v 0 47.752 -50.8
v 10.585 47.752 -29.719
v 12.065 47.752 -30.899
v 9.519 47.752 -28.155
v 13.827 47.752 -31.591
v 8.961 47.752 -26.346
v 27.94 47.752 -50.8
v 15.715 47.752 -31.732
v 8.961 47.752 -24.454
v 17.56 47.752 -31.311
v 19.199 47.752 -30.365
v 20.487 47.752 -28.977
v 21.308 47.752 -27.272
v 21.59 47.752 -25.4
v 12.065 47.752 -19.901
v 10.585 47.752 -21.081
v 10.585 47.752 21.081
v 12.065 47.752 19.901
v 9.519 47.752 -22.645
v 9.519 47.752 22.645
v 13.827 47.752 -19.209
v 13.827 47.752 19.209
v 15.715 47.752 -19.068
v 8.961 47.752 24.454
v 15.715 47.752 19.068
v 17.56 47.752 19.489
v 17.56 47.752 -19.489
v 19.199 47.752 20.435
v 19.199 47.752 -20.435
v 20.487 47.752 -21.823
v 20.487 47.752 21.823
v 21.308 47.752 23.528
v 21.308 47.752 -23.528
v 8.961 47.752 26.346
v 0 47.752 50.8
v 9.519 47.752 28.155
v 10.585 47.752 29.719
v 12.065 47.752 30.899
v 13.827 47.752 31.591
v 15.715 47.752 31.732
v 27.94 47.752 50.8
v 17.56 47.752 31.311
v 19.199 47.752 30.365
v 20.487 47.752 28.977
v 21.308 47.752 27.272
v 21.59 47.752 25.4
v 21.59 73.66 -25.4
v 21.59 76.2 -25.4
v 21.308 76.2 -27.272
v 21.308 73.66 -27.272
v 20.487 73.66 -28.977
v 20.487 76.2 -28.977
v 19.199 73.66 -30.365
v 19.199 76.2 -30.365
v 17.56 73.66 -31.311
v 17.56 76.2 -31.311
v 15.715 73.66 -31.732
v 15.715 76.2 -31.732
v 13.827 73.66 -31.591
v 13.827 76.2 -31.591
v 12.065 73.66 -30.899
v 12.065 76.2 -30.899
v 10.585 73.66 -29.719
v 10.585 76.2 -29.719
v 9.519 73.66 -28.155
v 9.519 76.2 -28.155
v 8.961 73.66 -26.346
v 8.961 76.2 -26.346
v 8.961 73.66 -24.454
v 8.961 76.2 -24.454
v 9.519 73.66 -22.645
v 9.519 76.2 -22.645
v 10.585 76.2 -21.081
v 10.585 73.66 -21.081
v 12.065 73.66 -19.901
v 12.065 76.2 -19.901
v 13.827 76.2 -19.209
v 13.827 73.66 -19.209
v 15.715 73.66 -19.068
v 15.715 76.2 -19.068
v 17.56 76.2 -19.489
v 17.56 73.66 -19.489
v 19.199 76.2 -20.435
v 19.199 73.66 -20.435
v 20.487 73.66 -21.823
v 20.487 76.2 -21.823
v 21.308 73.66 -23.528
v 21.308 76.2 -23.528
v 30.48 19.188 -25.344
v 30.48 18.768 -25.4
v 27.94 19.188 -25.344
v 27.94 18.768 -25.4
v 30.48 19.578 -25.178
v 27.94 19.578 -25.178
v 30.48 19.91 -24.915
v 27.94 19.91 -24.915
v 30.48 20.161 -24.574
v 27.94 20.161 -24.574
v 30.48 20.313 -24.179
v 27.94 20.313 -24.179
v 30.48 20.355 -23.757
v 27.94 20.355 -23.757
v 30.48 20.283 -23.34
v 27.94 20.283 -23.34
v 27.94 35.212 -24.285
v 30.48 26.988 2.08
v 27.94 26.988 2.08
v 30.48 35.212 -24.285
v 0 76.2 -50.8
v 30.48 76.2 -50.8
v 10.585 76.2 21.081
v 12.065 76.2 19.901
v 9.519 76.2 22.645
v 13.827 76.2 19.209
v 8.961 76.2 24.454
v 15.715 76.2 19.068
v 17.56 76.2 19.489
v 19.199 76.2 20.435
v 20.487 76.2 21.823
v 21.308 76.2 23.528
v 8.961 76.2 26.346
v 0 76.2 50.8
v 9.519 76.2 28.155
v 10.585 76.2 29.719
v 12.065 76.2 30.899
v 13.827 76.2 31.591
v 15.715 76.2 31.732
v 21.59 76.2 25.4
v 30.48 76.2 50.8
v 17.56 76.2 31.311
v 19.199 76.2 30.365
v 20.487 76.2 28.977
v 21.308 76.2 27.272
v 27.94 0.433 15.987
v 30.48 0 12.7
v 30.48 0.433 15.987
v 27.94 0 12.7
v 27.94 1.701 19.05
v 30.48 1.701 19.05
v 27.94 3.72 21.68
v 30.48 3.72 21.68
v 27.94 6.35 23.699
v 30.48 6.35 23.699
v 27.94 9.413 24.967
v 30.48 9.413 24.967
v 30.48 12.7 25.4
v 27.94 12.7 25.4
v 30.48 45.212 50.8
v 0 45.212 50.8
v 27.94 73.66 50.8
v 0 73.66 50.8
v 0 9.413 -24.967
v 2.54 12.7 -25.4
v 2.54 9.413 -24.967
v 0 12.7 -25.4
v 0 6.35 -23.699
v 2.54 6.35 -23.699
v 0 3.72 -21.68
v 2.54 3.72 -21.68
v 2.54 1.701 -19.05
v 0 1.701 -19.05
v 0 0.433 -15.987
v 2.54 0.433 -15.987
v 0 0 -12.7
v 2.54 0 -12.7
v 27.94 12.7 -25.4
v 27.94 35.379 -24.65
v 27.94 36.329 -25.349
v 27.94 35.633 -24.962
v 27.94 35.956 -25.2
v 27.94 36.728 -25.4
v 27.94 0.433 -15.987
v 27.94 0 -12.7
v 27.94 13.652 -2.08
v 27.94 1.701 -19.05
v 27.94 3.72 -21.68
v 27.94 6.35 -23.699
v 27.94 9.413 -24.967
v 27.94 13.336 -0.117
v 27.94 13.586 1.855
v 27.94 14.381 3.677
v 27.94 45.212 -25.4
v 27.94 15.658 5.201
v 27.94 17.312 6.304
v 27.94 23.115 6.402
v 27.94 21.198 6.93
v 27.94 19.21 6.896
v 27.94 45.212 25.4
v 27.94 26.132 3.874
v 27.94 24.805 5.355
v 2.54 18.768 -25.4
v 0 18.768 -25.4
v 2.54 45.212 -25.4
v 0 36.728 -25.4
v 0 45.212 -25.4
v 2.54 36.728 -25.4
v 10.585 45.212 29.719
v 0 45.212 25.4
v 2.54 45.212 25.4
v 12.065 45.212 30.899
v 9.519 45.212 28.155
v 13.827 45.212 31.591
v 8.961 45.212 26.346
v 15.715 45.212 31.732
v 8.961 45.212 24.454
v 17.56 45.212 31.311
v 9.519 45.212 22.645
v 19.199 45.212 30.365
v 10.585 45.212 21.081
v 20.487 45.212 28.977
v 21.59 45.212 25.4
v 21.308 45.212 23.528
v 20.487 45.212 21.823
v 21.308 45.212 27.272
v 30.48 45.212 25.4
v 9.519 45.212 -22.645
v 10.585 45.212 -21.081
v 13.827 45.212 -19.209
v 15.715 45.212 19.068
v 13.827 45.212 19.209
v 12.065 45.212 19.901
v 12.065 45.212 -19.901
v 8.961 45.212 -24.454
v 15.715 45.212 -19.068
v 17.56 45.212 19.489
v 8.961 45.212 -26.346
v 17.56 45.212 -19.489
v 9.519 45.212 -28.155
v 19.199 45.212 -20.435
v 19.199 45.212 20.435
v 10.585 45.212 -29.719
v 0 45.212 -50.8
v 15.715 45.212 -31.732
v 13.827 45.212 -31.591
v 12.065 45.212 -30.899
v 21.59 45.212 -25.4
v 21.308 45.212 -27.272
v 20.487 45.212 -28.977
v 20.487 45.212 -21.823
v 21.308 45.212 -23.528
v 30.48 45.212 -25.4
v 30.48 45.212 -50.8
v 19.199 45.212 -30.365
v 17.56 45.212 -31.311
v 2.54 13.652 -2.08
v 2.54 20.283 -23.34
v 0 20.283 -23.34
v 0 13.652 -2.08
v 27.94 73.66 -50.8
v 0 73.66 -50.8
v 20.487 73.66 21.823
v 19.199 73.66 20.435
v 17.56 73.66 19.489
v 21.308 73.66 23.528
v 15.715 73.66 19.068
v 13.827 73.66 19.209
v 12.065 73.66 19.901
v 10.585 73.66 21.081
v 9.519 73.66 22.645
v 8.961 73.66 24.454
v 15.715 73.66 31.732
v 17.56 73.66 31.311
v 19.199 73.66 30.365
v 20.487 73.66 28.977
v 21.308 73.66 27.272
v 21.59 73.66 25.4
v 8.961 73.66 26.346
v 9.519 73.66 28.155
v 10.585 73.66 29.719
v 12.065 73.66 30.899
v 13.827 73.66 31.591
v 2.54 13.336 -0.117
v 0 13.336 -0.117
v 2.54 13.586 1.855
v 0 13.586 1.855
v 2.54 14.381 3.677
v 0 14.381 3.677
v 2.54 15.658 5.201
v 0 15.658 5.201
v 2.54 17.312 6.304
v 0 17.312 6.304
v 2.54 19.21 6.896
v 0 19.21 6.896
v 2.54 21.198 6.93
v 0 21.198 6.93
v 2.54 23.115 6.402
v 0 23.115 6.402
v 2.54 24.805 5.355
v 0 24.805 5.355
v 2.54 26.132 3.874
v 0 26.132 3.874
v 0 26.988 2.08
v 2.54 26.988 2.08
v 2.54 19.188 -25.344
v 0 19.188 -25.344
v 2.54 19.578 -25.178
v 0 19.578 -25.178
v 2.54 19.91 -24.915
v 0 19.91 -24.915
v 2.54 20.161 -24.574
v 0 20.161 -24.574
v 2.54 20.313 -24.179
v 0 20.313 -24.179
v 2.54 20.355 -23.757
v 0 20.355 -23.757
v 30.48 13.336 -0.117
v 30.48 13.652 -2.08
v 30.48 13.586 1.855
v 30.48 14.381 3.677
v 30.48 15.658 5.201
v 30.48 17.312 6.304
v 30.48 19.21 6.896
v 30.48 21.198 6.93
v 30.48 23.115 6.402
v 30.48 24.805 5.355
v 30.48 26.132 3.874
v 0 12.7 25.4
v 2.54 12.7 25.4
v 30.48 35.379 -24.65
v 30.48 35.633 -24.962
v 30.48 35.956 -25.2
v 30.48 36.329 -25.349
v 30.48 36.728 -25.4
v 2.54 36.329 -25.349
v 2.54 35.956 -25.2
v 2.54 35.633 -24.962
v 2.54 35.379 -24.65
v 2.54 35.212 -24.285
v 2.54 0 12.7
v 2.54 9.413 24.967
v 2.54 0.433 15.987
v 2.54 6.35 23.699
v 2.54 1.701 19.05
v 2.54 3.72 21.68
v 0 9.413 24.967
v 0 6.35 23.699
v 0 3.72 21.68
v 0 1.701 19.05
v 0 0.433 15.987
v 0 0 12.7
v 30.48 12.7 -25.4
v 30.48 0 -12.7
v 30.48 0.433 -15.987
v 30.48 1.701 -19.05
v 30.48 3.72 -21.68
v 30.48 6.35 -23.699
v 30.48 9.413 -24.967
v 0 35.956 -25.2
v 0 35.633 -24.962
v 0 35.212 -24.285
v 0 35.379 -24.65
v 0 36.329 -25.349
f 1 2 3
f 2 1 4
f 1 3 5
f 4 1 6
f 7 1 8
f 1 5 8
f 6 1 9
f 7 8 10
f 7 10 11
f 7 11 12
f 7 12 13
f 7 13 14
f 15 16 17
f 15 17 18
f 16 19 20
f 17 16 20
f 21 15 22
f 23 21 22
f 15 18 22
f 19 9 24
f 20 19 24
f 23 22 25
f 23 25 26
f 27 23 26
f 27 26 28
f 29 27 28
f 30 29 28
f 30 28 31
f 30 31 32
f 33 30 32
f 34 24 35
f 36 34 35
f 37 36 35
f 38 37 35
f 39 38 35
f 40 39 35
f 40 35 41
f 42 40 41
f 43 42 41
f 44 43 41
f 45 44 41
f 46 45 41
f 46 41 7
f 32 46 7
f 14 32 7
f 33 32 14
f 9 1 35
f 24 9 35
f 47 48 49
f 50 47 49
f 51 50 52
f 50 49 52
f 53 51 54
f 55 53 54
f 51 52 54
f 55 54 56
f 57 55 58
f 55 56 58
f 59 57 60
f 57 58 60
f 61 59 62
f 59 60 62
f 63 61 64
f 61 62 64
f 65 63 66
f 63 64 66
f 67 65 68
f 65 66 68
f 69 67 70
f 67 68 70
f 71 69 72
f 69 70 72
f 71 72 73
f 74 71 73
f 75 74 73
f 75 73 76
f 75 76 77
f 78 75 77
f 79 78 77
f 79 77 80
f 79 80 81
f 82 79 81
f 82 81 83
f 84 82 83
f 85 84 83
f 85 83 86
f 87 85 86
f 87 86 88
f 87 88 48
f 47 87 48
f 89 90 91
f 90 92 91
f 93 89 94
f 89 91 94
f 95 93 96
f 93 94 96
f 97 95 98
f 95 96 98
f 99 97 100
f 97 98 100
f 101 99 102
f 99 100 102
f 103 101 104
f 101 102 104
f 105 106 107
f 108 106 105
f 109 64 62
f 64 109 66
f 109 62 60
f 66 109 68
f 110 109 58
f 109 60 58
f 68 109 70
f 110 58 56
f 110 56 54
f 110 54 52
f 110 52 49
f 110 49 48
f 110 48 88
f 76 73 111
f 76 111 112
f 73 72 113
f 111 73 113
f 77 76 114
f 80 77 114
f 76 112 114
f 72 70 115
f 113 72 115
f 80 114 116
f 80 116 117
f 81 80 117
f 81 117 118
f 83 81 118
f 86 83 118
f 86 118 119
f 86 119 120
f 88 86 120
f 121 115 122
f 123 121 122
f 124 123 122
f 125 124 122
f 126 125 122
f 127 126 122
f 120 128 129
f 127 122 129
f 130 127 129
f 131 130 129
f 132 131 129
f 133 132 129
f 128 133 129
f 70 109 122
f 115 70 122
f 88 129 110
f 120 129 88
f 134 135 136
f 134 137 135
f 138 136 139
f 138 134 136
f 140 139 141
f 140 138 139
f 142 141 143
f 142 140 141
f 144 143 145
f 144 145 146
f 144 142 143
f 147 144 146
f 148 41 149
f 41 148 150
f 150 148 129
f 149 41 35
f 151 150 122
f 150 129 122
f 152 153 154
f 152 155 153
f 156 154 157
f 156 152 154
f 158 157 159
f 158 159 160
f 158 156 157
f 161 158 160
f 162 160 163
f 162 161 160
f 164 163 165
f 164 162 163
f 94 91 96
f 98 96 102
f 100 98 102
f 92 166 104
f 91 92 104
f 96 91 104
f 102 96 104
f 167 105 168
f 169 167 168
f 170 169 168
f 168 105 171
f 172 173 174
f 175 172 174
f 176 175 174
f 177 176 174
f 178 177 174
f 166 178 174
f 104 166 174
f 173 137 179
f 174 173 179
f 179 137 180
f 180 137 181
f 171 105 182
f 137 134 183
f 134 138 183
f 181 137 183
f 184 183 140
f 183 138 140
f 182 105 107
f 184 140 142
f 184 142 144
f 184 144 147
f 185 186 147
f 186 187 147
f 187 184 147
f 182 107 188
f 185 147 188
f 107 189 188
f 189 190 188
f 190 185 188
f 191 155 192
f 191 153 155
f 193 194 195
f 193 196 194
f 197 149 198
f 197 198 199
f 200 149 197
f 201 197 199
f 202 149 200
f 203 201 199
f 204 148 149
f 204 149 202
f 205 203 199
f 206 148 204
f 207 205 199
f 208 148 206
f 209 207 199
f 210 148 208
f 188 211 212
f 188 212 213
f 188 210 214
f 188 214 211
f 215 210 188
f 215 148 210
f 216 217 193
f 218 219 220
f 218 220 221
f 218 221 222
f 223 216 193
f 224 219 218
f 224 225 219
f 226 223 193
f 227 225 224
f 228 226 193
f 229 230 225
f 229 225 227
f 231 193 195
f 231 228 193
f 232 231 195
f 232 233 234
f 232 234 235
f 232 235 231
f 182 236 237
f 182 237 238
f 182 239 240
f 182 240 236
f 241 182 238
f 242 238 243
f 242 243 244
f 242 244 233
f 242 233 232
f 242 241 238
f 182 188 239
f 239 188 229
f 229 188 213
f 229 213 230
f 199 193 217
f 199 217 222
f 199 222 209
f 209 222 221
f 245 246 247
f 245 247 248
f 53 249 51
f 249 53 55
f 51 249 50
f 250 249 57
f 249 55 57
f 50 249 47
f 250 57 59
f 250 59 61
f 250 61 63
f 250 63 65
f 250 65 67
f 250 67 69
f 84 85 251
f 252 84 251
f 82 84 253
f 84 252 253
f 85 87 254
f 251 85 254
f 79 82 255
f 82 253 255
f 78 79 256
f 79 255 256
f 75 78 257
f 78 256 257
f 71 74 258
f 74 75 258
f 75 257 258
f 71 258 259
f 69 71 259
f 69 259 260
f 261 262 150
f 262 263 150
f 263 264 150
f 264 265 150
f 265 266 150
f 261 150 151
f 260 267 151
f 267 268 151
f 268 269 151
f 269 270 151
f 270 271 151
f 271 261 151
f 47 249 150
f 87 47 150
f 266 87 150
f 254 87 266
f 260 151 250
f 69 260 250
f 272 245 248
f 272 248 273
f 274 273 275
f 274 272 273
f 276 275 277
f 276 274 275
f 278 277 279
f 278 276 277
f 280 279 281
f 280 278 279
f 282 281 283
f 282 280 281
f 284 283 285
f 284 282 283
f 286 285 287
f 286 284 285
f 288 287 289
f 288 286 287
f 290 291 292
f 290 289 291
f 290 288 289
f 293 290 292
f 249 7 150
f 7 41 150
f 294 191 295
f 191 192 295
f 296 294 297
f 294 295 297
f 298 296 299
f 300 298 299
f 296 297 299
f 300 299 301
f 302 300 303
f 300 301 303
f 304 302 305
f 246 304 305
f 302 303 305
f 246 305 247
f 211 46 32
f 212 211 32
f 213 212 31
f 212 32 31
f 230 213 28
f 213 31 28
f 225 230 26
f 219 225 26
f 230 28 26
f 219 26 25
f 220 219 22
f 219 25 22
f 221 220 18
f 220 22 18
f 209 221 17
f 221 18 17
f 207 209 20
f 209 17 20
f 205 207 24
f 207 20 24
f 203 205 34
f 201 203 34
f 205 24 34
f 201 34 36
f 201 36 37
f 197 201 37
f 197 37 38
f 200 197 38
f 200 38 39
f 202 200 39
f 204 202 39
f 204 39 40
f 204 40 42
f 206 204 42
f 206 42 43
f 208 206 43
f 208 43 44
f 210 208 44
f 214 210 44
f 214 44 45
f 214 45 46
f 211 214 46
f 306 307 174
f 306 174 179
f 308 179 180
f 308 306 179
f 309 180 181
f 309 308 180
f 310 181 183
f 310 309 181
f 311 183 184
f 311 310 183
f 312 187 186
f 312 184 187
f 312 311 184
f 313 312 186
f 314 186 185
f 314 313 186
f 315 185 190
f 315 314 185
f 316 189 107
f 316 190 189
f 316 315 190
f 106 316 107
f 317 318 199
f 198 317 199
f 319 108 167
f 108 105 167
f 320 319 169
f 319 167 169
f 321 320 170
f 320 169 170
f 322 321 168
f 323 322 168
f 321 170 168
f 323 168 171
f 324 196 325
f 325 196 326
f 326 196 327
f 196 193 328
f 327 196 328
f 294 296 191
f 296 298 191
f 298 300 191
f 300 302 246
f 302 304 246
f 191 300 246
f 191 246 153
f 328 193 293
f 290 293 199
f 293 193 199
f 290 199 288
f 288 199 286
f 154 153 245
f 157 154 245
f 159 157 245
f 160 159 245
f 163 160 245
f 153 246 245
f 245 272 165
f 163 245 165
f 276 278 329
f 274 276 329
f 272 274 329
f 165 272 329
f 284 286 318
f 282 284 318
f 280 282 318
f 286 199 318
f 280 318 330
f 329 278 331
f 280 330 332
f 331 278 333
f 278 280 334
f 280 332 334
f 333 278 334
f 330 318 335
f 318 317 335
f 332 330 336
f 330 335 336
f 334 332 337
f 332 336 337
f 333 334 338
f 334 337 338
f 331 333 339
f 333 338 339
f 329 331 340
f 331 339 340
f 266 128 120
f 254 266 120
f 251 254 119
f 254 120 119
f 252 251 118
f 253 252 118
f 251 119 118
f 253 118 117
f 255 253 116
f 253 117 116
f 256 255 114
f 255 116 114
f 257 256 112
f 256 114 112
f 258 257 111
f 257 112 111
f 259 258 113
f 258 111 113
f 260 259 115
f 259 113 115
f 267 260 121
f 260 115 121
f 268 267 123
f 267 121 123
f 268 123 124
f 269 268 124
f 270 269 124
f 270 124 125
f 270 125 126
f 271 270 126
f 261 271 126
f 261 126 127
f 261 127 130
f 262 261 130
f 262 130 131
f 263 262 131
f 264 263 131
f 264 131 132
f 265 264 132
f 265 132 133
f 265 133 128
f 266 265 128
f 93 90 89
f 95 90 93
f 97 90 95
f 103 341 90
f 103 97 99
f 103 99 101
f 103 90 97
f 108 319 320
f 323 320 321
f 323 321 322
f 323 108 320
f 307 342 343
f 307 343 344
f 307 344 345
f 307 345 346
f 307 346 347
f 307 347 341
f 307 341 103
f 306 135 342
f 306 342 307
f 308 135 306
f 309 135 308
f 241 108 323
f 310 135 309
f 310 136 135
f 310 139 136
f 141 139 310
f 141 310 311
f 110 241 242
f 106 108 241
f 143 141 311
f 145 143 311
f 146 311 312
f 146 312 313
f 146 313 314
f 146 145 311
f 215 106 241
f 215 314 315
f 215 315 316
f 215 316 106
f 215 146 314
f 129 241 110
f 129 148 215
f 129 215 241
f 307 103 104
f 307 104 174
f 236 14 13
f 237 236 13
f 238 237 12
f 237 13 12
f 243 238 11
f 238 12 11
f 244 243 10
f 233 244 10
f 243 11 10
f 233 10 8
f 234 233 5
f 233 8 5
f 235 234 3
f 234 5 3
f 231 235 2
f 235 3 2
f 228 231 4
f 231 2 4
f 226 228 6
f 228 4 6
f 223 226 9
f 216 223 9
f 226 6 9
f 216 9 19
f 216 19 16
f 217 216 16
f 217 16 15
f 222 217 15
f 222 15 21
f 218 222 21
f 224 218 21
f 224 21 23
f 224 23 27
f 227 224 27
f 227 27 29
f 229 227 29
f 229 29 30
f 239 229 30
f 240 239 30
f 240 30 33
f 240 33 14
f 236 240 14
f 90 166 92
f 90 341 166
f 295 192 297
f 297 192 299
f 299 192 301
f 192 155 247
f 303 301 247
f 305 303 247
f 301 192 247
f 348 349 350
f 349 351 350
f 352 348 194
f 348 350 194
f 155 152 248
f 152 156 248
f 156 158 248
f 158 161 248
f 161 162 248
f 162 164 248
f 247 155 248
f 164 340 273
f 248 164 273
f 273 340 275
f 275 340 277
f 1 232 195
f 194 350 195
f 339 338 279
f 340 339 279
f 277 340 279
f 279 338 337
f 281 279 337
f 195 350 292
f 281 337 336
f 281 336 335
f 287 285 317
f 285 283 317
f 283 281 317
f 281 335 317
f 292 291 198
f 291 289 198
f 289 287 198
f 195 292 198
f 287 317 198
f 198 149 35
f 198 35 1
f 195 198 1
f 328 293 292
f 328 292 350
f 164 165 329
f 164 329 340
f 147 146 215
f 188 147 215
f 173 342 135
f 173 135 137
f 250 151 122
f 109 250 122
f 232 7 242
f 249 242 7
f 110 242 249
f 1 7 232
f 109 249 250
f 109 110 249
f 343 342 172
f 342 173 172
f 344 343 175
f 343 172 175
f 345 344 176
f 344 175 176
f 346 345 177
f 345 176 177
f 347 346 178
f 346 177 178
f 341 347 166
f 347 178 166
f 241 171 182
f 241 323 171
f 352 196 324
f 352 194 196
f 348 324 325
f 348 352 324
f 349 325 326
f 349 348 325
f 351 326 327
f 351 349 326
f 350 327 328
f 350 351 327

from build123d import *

# Parameters (mm, degrees)
BOSS_EXTRUDE1_DEPTH     = 50.8
SKETCH4_W               = 25.4
SKETCH4_H               = 45.212
CUT_EXTRUDE1_DEPTH      = 1
CUT_EXTRUDE1_DEPTH_BACK = 31.48
CUT_EXTRUDE4_DEPTH      = 1
CUT_EXTRUDE4_DEPTH_BACK = 31.48
SKETCH8_R               = 6.35
BOLT_HOLES_DEPTH        = 1
BOLT_HOLES_DEPTH_BACK   = 77.2
FILLET3_R               = 12.7
FILLET4_R               = 1.5875


with BuildPart() as part:
    # Sketch1 → Boss-Extrude1 (new body, symmetric)
    with BuildSketch(Plane.XY):
        Polygon((0, 76.2), (30.48, 76.2), (30.48, 73.66), (30.48, 47.752), (30.48, 0), (27.94, 0), (27.94, 45.212), (2.54, 45.212), (2.54, 0), (0, 0), (0, 47.752), (27.94, 47.752), (27.94, 73.66), (0, 73.66), align=None)
    extrude(amount=BOSS_EXTRUDE1_DEPTH, both=True)

    # Sketch4 → Cut-Extrude1 (cut, two sides)
    with BuildSketch(Plane(origin=(30.48, 0, 0), x_dir=(0, 0, -1), z_dir=(1, 0, 0))) as cut_extrude1_sk:
        with Locations((-38.1, 22.606)):
            Rectangle(SKETCH4_W, SKETCH4_H)
        with Locations((38.1, 22.606)):
            Rectangle(SKETCH4_W, SKETCH4_H)
    extrude(amount=CUT_EXTRUDE1_DEPTH, mode=Mode.SUBTRACT)
    extrude(cut_extrude1_sk.sketch, amount=-CUT_EXTRUDE1_DEPTH_BACK, mode=Mode.SUBTRACT)

    # Sketch7 → Cut-Extrude4 (cut, two sides)
    with BuildSketch(Plane(origin=(30.48, 0, 0), x_dir=(0, 0, -1), z_dir=(1, 0, 0))) as cut_extrude4_sk:
        with BuildLine():
            Line((-2.079997498, 26.98812083), (25.4, 35.56))
            Line((25.4, 35.56), (25.4, 20.926124507))
            Line((25.4, 20.926124507), (2.079997498, 13.65187917))
            ThreePointArc((2.079997498, 13.65187917), (-6.66812083, 18.240002502), (-2.079997498, 26.98812083))
        make_face()
    extrude(amount=CUT_EXTRUDE4_DEPTH, mode=Mode.SUBTRACT)
    extrude(cut_extrude4_sk.sketch, amount=-CUT_EXTRUDE4_DEPTH_BACK, mode=Mode.SUBTRACT)

    # Sketch8 → BOLT HOLES (cut, two sides)
    with BuildSketch(Plane(origin=(0, 76.2, 0), x_dir=(1, 0, 0), z_dir=(0, 1, 0))) as bolt_holes_sk:
        with Locations((15.24, -25.4)):
            Circle(SKETCH8_R)
        with Locations((15.24, 25.4)):
            Circle(SKETCH8_R)
    extrude(amount=BOLT_HOLES_DEPTH, mode=Mode.SUBTRACT)
    extrude(bolt_holes_sk.sketch, amount=-BOLT_HOLES_DEPTH_BACK, mode=Mode.SUBTRACT)

    # Fillet3
    fillet3_edges = [part.edges().sort_by_distance(p)[0] for p in [
        (1.27, 0, 25.4),
        (29.21, 0, 25.4),
        (1.27, 0, -25.4),
        (29.21, 0, -25.4),
    ]]
    fillet(fillet3_edges, radius=FILLET3_R)

    # Fillet4
    fillet4_edges = [part.edges().sort_by_distance(p)[0] for p in [
        (1.27, 35.56, -25.4),
        (29.21, 35.56, -25.4),
        (1.27, 20.926124507, -25.4),
        (29.21, 20.926124507, -25.4),
    ]]
    fillet(fillet4_edges, radius=FILLET4_R)


solid = part.part
